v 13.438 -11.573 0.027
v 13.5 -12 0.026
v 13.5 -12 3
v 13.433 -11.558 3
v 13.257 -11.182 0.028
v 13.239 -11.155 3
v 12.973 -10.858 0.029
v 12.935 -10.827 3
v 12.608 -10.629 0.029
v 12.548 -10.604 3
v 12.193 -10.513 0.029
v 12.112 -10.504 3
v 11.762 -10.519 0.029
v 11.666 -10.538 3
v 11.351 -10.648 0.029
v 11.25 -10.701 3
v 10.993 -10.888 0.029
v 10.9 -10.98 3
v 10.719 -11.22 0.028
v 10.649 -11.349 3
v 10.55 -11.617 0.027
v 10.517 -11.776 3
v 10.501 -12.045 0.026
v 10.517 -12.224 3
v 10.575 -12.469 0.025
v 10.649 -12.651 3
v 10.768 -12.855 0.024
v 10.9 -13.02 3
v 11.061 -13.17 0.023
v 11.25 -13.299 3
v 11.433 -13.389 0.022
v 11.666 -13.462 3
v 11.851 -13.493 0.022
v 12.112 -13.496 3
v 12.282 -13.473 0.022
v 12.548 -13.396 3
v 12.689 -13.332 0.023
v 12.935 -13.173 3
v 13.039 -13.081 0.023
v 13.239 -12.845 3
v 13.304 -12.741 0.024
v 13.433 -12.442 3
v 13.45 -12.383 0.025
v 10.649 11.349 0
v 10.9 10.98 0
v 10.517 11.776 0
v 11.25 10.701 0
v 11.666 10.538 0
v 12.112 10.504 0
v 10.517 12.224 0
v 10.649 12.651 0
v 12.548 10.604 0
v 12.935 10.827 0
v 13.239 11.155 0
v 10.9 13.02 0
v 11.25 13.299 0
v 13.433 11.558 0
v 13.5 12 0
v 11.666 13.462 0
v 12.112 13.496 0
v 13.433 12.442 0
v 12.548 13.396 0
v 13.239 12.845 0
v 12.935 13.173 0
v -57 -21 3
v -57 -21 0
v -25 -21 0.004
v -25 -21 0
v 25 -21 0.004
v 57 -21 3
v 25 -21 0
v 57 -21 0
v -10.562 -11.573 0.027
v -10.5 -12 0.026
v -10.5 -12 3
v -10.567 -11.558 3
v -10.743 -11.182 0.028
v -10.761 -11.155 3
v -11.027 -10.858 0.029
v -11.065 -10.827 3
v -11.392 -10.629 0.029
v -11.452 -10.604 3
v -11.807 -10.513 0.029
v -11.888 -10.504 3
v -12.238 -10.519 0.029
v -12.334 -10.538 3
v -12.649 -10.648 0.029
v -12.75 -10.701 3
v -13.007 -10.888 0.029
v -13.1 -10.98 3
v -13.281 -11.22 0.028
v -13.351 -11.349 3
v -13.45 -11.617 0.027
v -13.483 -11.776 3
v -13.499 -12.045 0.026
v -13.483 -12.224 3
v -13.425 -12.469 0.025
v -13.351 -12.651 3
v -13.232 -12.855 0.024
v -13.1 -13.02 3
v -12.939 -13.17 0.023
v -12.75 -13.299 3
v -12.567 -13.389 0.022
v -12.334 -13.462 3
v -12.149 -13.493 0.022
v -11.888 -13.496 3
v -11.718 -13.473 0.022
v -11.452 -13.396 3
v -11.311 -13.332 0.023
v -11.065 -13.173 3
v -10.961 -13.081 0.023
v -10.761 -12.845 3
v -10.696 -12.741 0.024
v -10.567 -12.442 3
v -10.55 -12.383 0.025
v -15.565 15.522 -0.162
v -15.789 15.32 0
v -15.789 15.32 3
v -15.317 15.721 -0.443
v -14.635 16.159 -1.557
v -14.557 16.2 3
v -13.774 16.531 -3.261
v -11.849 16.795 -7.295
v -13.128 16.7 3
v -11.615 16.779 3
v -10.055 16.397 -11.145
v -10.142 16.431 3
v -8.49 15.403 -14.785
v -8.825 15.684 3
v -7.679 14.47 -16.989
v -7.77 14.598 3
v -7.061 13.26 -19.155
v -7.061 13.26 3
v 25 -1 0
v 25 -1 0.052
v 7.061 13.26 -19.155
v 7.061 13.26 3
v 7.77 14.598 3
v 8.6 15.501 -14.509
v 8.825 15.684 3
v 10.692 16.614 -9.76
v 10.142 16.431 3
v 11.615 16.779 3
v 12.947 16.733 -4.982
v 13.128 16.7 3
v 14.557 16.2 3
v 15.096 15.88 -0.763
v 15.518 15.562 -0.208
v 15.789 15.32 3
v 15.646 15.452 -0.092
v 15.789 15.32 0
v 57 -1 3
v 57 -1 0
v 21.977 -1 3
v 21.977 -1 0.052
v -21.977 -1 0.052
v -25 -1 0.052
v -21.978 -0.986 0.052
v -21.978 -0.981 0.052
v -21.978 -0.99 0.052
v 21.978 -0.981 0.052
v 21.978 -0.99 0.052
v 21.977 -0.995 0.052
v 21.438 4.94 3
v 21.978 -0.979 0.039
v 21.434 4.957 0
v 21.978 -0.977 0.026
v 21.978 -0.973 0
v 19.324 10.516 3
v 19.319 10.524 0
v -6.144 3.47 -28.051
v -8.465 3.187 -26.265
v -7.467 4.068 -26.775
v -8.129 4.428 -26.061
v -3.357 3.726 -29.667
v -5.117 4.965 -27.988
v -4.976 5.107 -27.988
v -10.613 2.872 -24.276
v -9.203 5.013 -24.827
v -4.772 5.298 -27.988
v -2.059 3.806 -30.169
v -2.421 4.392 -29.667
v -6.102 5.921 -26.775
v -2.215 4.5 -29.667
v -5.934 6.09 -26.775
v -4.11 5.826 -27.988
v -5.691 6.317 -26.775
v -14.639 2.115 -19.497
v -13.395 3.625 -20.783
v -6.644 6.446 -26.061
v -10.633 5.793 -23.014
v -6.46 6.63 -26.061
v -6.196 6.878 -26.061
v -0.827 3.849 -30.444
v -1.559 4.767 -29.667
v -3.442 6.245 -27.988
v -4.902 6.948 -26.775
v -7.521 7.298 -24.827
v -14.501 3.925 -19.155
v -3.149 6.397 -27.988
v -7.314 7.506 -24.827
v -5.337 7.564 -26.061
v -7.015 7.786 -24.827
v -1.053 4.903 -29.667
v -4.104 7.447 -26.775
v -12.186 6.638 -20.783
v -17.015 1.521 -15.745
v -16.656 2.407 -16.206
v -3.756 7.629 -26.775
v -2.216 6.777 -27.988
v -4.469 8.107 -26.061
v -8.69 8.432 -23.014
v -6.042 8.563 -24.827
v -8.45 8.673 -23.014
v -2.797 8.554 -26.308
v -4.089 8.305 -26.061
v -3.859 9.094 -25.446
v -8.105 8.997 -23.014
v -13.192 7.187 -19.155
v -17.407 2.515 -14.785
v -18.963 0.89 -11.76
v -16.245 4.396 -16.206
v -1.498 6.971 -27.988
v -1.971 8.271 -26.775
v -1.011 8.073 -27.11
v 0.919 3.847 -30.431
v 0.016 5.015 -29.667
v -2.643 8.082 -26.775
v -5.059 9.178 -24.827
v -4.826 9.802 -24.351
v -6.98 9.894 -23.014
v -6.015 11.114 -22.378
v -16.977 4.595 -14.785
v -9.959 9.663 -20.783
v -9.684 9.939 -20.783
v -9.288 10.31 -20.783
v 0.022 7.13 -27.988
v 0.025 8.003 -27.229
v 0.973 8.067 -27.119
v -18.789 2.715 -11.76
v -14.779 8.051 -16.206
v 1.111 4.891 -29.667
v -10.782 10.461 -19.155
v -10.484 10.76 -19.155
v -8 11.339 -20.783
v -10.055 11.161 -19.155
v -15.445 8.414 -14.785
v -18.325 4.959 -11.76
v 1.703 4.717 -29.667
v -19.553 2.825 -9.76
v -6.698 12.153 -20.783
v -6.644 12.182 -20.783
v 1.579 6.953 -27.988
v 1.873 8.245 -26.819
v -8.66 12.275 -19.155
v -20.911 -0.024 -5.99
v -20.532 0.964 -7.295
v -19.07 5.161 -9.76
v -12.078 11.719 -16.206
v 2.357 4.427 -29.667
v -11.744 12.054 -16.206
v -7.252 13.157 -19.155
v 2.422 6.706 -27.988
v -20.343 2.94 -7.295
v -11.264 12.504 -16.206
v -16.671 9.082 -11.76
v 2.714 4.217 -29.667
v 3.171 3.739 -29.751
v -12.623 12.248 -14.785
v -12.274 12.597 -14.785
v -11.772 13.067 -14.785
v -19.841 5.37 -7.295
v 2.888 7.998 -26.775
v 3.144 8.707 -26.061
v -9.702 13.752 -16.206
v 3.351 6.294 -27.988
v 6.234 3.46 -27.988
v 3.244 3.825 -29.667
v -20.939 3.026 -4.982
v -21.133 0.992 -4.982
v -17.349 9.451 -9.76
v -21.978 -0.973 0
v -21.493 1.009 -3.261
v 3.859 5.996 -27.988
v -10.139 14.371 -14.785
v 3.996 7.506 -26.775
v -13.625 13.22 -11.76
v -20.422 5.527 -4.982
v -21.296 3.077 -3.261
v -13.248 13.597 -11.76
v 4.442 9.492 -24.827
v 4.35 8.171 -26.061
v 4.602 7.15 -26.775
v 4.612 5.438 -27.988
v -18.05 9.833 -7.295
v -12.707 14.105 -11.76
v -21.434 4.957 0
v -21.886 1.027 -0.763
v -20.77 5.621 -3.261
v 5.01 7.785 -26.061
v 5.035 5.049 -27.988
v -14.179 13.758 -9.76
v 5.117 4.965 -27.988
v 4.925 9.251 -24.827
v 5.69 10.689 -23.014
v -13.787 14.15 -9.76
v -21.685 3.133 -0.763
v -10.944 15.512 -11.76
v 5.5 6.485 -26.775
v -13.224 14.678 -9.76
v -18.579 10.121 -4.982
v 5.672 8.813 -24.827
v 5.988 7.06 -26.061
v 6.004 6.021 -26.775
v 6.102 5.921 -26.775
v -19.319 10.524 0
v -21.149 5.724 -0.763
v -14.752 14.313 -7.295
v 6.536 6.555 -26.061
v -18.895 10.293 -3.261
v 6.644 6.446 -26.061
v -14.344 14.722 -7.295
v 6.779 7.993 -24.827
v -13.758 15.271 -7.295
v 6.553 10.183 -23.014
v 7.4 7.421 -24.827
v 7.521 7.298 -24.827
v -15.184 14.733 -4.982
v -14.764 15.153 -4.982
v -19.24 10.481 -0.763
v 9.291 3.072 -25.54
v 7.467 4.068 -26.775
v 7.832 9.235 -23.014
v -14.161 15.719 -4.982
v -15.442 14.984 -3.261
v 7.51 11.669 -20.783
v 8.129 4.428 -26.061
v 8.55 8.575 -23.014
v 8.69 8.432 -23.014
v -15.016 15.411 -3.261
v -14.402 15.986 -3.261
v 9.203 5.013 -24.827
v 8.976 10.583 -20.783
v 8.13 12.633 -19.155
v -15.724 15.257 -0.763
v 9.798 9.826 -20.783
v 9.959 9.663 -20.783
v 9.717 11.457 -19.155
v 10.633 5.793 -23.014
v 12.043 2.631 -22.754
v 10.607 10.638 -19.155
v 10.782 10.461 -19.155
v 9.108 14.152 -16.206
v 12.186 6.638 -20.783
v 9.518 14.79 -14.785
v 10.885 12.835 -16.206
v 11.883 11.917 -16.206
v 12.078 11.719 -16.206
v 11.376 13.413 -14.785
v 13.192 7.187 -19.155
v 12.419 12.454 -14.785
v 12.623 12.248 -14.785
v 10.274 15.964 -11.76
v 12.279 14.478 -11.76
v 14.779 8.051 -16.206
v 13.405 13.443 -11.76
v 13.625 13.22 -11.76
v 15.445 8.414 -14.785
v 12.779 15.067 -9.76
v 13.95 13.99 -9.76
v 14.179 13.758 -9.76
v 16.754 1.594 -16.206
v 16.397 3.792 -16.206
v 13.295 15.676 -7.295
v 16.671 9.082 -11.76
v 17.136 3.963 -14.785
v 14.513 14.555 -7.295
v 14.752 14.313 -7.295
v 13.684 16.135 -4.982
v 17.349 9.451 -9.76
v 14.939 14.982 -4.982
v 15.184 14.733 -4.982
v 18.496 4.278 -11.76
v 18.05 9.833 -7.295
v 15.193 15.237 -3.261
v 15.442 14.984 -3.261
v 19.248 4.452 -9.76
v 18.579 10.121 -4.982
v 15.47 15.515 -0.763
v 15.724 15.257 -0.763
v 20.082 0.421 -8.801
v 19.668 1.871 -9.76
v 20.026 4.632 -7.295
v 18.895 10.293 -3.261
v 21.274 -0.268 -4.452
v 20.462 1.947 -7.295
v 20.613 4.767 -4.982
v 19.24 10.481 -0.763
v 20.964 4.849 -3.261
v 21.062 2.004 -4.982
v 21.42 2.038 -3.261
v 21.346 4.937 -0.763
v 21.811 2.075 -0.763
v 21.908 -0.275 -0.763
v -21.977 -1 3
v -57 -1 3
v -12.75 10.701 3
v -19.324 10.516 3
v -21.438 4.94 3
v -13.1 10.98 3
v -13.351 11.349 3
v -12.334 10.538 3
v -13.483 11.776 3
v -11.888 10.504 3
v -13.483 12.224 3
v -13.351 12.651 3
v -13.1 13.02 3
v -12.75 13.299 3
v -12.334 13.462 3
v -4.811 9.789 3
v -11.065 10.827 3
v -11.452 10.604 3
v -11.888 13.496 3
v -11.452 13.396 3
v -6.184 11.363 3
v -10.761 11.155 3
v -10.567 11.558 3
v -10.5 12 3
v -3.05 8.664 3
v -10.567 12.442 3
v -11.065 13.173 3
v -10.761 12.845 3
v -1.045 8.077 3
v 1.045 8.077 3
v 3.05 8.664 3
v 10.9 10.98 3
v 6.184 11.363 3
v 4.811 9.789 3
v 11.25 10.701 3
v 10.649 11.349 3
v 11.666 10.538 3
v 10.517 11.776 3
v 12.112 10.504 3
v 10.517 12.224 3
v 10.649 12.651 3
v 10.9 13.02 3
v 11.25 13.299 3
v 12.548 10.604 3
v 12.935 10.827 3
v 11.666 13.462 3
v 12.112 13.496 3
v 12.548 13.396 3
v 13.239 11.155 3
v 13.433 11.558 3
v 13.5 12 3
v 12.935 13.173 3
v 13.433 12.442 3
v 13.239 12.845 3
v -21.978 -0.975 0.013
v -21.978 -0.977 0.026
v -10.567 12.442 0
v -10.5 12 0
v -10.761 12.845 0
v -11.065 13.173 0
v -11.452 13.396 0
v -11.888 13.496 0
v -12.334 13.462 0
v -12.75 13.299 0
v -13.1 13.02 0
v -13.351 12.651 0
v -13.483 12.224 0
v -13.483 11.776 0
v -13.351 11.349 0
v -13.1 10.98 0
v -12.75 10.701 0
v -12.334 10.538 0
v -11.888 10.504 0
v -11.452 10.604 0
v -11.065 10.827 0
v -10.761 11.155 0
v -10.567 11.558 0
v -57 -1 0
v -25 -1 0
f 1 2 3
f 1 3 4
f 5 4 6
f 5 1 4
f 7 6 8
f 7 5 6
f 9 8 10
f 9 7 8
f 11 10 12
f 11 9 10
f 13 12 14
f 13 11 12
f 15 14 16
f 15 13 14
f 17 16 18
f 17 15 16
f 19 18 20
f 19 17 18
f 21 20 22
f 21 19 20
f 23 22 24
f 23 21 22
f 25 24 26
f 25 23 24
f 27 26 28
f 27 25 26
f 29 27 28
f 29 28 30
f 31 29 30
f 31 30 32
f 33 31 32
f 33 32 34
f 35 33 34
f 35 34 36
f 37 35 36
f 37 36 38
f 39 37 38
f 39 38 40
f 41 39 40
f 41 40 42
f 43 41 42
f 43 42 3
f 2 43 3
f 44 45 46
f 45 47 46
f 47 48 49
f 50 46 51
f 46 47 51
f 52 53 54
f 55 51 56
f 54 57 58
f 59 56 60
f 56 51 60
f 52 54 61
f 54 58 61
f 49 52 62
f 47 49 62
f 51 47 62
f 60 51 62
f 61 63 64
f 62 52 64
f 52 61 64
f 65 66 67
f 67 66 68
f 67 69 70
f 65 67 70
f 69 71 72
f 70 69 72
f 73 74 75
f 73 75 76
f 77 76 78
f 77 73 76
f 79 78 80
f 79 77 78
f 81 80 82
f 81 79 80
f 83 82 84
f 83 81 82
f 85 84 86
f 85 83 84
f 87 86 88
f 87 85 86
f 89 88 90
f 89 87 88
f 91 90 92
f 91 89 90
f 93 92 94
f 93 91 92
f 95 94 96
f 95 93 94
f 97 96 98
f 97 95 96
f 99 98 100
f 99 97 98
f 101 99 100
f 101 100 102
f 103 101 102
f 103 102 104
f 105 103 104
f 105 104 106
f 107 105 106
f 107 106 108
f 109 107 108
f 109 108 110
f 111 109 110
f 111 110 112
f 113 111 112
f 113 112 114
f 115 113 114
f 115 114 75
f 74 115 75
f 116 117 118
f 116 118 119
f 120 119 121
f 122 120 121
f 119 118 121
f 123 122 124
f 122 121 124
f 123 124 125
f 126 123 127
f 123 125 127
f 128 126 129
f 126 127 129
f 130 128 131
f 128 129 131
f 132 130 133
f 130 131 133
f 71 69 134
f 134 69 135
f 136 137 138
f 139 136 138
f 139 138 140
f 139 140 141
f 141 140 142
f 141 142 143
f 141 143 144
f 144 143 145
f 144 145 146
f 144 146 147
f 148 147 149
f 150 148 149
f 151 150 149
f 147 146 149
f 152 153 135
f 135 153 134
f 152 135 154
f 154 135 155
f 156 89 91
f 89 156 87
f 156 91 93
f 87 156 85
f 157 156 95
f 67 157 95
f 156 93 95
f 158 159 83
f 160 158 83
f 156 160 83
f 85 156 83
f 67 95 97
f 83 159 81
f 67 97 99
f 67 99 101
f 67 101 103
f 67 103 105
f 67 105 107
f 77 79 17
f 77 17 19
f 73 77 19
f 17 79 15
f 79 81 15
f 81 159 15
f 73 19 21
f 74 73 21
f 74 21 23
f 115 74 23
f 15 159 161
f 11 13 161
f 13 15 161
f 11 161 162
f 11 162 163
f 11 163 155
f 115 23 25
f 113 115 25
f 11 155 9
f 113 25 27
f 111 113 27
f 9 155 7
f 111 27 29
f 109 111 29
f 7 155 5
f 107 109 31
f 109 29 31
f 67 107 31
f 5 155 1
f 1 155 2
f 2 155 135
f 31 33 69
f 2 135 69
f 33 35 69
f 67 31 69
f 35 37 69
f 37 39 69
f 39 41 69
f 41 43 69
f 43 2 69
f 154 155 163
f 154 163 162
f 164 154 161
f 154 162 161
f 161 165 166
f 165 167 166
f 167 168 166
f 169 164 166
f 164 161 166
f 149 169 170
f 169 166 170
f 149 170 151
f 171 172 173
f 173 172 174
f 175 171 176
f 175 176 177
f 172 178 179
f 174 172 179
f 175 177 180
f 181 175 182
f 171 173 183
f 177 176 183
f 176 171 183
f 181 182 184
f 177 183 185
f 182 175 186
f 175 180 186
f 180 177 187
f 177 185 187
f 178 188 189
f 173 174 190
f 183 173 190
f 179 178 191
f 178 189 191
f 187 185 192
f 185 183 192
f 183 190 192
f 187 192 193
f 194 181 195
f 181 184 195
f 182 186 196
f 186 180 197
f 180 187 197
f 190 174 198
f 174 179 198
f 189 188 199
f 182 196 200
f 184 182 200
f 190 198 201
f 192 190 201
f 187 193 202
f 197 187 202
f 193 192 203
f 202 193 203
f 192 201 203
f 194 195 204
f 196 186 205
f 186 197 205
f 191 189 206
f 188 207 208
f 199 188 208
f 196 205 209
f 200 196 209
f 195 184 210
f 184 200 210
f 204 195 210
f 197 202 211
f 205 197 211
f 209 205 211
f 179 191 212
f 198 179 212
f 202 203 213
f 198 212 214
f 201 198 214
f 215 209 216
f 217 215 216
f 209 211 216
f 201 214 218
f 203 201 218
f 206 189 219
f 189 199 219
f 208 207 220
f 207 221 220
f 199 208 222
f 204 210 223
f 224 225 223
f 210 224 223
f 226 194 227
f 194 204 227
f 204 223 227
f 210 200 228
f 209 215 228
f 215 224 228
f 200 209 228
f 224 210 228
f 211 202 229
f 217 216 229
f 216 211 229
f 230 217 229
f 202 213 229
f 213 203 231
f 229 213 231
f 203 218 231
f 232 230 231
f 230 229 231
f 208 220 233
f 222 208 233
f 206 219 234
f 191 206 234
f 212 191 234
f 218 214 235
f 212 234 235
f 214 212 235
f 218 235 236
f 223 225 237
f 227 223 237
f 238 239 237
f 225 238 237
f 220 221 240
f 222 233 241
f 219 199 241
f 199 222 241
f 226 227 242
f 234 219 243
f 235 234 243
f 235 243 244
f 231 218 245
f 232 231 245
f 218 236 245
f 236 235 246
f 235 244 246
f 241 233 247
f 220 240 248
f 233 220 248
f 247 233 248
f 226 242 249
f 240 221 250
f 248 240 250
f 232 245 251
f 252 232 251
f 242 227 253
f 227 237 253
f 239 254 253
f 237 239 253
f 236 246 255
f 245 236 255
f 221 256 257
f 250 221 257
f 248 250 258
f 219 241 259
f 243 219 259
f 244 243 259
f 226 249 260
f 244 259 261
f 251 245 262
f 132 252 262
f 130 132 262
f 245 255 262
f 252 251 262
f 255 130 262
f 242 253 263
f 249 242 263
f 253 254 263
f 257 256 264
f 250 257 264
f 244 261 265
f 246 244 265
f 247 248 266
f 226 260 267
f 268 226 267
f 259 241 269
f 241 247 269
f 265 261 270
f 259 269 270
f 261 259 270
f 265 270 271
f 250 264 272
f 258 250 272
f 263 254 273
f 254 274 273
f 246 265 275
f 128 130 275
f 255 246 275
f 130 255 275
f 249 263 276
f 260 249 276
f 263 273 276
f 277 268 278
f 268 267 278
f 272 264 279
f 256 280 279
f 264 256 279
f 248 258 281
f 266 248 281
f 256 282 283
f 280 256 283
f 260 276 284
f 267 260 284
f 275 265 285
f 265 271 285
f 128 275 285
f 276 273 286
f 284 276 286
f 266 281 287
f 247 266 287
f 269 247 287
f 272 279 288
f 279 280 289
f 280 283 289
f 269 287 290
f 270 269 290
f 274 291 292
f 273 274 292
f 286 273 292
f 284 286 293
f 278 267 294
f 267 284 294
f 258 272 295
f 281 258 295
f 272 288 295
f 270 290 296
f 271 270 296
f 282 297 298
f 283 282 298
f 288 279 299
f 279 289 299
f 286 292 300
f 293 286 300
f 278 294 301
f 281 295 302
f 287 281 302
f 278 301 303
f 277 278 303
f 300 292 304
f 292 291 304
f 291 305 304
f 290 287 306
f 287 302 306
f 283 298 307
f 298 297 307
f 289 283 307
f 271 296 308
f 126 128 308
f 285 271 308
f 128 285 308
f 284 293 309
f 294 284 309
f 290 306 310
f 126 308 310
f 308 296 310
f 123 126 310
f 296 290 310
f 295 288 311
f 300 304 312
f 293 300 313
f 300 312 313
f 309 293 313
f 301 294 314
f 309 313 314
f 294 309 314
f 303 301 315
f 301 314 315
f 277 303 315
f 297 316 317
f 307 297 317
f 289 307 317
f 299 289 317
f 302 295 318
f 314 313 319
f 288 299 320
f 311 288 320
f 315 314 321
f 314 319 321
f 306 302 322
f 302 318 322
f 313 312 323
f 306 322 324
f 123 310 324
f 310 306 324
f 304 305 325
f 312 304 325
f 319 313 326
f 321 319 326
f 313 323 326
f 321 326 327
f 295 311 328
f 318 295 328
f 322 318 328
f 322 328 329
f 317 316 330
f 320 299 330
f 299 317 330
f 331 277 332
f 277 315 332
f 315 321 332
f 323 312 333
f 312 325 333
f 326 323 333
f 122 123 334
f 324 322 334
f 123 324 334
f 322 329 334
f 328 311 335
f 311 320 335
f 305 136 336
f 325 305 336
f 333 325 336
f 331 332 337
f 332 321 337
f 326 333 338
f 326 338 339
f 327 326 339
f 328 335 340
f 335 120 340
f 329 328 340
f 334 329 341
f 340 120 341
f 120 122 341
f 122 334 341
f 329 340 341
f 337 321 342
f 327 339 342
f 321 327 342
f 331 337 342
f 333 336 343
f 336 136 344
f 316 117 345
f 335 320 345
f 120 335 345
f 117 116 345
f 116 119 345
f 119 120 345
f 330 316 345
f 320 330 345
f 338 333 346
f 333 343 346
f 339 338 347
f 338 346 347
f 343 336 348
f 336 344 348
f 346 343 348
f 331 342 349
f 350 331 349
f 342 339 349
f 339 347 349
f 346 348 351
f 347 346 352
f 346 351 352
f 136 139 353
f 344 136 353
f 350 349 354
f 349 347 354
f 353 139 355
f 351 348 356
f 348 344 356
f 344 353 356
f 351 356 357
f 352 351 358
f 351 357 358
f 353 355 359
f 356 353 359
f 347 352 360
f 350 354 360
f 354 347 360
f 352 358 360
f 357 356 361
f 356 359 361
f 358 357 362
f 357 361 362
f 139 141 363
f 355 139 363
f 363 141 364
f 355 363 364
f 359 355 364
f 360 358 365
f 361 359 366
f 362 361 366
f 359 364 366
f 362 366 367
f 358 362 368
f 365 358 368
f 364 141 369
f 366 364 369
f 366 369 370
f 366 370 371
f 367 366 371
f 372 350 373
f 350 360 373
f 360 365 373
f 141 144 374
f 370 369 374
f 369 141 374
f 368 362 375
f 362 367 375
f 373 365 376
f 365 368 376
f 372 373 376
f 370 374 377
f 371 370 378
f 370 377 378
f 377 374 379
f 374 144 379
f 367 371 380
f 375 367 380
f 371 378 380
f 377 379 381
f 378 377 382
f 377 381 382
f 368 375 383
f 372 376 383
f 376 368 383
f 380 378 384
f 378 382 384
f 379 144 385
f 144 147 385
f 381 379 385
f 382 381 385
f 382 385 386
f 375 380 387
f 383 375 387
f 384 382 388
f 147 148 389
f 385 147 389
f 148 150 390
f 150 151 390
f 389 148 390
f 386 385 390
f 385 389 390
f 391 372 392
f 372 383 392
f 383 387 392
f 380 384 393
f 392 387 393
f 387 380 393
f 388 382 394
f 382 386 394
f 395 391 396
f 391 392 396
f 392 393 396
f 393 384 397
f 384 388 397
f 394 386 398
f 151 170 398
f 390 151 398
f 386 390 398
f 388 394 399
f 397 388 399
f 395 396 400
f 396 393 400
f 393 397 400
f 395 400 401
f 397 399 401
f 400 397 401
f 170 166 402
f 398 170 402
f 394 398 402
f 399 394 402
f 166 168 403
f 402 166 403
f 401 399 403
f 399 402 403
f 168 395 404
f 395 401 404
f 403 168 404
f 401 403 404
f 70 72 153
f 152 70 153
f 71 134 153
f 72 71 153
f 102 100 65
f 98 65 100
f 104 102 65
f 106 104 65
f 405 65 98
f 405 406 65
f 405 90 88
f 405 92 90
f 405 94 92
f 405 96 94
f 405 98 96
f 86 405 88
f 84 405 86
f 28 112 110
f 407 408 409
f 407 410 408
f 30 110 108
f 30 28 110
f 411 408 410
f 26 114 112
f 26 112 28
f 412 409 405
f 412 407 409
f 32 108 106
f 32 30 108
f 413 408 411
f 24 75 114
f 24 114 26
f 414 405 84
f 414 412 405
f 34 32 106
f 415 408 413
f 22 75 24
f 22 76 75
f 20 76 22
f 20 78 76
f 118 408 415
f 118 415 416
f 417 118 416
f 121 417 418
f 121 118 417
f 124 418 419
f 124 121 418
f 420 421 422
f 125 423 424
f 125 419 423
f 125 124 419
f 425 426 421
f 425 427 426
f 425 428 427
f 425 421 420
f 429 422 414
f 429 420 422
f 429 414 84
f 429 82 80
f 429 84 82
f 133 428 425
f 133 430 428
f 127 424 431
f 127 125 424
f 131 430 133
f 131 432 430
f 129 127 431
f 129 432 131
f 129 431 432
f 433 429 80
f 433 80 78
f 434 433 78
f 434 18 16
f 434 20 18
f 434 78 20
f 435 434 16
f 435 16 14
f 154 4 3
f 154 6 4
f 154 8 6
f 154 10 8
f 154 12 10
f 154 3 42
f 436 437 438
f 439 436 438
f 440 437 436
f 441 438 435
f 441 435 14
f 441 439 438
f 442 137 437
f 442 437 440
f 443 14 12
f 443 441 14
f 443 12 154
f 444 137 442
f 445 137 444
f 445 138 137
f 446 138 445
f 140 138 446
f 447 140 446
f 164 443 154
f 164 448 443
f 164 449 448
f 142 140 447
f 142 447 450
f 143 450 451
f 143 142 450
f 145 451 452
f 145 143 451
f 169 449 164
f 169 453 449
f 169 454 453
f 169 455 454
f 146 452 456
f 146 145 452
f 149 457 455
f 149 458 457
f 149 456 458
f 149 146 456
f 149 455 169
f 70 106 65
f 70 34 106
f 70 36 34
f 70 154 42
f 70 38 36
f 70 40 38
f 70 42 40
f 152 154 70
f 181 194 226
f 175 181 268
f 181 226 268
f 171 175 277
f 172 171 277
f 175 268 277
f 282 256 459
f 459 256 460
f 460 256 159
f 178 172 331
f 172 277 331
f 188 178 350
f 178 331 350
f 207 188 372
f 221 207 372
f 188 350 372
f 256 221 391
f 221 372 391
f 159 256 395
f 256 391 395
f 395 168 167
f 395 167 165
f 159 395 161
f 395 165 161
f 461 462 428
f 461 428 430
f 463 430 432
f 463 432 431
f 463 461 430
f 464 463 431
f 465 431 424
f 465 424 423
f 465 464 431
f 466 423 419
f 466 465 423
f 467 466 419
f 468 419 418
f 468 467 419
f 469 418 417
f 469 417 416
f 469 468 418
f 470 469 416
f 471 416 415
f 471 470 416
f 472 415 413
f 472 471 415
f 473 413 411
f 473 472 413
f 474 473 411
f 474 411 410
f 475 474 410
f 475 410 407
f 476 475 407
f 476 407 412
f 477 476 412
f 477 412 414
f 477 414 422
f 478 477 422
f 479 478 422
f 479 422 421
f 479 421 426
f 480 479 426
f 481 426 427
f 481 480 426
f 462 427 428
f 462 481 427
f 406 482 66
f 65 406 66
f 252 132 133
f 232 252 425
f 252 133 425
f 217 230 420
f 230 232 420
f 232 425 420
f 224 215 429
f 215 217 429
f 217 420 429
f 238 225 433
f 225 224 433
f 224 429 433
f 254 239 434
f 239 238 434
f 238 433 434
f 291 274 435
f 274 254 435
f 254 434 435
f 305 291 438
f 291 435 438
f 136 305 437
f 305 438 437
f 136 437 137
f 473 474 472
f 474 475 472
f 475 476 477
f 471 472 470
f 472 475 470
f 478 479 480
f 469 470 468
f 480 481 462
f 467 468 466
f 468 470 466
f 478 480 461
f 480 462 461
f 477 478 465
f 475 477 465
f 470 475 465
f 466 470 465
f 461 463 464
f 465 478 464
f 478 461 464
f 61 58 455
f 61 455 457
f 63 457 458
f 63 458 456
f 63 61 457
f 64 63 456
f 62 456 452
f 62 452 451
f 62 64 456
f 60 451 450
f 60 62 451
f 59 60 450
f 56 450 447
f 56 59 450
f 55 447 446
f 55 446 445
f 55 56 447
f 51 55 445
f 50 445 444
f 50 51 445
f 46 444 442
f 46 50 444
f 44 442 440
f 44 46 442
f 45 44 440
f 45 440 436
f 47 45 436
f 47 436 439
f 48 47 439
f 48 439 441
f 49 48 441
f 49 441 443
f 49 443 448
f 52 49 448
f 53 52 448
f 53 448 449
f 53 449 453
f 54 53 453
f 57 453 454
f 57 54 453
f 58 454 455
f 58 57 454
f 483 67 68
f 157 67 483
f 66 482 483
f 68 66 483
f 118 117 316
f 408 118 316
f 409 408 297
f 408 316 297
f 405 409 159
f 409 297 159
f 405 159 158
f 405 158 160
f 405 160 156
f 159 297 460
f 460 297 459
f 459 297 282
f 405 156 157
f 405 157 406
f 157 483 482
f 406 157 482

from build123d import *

# Parameters (mm, degrees)
F0_R     = 1.5
F1_DEPTH = 3
F5_DEPTH = 25
F7_DEPTH = 35


# Not quite as in the source:
# - a feature names something its author has since deleted; it is built from what else it names


with BuildPart() as f1:
    # F0 (on Top) → F1 (new body)
    with BuildSketch(Plane.XY):
        with BuildLine():
            Line((6.5574385243, -21), (57, -21))
            Line((57, -21), (57, -1))
            Line((57, -1), (21.9772609758, -1))
            ThreePointArc((21.9772609758, -1), (0, 22), (-21.9772609758, -1))
            Line((-21.9772609758, -1), (-57, -1))
            Line((-57, -1), (-57, -21))
            Line((-57, -21), (6.5574385243, -21))
        make_face()
        with Locations((-12, -12)):
            Circle(F0_R, mode=Mode.SUBTRACT)
        with Locations((12, -12)):
            Circle(F0_R, mode=Mode.SUBTRACT)
        with Locations((-12, 12)):
            Circle(F0_R, mode=Mode.SUBTRACT)
        with Locations((12, 12)):
            Circle(F0_R, mode=Mode.SUBTRACT)
    extrude(amount=F1_DEPTH)

    # F2 (on Right) → F3 (revolve)
    with BuildSketch(Plane.YZ):
        with BuildLine():
            Line((0, 0), (0, -32.8796606992))
            ThreePointArc((0, -32.8796606992), (15.0334447446, -19.1386350968), (22, 0))
            Line((22, 0), (0, 0))
        make_face()
    revolve(axis=Axis((0, 0, -16.4398303496), (0, 0, -1)))

    # F4 (on Right) → F5 (cut, symmetric)
    with BuildSketch(Plane.YZ):
        Polygon((7.20365692, -51.6230810942), (-0.9809204616, 0.0523067461), (-22.7521642769, 0), (-21.7191129923, -52.1955192089), align=None)
    extrude(amount=F5_DEPTH, both=True, mode=Mode.SUBTRACT)

    # F6 (on face) → F7 (cut)
    with BuildSketch(Plane.XY.offset(3)):
        with BuildLine():
            ThreePointArc((-15.7890972634, 15.3200655223), (-10.8662470151, 16.6578455627), (-7.0613301317, 13.2597994308))
            ThreePointArc((-7.0613301317, 13.2597994308), (0, 8.0029264883), (7.0613301317, 13.2597994308))
            ThreePointArc((7.0613301317, 13.2597994308), (10.8662470151, 16.6578455627), (15.7890972634, 15.3200655223))
            ThreePointArc((15.7890972634, 15.3200655223), (0, 22), (-15.7890972634, 15.3200655223))
        make_face()
    extrude(amount=-F7_DEPTH, mode=Mode.SUBTRACT)


solid = f1.part
